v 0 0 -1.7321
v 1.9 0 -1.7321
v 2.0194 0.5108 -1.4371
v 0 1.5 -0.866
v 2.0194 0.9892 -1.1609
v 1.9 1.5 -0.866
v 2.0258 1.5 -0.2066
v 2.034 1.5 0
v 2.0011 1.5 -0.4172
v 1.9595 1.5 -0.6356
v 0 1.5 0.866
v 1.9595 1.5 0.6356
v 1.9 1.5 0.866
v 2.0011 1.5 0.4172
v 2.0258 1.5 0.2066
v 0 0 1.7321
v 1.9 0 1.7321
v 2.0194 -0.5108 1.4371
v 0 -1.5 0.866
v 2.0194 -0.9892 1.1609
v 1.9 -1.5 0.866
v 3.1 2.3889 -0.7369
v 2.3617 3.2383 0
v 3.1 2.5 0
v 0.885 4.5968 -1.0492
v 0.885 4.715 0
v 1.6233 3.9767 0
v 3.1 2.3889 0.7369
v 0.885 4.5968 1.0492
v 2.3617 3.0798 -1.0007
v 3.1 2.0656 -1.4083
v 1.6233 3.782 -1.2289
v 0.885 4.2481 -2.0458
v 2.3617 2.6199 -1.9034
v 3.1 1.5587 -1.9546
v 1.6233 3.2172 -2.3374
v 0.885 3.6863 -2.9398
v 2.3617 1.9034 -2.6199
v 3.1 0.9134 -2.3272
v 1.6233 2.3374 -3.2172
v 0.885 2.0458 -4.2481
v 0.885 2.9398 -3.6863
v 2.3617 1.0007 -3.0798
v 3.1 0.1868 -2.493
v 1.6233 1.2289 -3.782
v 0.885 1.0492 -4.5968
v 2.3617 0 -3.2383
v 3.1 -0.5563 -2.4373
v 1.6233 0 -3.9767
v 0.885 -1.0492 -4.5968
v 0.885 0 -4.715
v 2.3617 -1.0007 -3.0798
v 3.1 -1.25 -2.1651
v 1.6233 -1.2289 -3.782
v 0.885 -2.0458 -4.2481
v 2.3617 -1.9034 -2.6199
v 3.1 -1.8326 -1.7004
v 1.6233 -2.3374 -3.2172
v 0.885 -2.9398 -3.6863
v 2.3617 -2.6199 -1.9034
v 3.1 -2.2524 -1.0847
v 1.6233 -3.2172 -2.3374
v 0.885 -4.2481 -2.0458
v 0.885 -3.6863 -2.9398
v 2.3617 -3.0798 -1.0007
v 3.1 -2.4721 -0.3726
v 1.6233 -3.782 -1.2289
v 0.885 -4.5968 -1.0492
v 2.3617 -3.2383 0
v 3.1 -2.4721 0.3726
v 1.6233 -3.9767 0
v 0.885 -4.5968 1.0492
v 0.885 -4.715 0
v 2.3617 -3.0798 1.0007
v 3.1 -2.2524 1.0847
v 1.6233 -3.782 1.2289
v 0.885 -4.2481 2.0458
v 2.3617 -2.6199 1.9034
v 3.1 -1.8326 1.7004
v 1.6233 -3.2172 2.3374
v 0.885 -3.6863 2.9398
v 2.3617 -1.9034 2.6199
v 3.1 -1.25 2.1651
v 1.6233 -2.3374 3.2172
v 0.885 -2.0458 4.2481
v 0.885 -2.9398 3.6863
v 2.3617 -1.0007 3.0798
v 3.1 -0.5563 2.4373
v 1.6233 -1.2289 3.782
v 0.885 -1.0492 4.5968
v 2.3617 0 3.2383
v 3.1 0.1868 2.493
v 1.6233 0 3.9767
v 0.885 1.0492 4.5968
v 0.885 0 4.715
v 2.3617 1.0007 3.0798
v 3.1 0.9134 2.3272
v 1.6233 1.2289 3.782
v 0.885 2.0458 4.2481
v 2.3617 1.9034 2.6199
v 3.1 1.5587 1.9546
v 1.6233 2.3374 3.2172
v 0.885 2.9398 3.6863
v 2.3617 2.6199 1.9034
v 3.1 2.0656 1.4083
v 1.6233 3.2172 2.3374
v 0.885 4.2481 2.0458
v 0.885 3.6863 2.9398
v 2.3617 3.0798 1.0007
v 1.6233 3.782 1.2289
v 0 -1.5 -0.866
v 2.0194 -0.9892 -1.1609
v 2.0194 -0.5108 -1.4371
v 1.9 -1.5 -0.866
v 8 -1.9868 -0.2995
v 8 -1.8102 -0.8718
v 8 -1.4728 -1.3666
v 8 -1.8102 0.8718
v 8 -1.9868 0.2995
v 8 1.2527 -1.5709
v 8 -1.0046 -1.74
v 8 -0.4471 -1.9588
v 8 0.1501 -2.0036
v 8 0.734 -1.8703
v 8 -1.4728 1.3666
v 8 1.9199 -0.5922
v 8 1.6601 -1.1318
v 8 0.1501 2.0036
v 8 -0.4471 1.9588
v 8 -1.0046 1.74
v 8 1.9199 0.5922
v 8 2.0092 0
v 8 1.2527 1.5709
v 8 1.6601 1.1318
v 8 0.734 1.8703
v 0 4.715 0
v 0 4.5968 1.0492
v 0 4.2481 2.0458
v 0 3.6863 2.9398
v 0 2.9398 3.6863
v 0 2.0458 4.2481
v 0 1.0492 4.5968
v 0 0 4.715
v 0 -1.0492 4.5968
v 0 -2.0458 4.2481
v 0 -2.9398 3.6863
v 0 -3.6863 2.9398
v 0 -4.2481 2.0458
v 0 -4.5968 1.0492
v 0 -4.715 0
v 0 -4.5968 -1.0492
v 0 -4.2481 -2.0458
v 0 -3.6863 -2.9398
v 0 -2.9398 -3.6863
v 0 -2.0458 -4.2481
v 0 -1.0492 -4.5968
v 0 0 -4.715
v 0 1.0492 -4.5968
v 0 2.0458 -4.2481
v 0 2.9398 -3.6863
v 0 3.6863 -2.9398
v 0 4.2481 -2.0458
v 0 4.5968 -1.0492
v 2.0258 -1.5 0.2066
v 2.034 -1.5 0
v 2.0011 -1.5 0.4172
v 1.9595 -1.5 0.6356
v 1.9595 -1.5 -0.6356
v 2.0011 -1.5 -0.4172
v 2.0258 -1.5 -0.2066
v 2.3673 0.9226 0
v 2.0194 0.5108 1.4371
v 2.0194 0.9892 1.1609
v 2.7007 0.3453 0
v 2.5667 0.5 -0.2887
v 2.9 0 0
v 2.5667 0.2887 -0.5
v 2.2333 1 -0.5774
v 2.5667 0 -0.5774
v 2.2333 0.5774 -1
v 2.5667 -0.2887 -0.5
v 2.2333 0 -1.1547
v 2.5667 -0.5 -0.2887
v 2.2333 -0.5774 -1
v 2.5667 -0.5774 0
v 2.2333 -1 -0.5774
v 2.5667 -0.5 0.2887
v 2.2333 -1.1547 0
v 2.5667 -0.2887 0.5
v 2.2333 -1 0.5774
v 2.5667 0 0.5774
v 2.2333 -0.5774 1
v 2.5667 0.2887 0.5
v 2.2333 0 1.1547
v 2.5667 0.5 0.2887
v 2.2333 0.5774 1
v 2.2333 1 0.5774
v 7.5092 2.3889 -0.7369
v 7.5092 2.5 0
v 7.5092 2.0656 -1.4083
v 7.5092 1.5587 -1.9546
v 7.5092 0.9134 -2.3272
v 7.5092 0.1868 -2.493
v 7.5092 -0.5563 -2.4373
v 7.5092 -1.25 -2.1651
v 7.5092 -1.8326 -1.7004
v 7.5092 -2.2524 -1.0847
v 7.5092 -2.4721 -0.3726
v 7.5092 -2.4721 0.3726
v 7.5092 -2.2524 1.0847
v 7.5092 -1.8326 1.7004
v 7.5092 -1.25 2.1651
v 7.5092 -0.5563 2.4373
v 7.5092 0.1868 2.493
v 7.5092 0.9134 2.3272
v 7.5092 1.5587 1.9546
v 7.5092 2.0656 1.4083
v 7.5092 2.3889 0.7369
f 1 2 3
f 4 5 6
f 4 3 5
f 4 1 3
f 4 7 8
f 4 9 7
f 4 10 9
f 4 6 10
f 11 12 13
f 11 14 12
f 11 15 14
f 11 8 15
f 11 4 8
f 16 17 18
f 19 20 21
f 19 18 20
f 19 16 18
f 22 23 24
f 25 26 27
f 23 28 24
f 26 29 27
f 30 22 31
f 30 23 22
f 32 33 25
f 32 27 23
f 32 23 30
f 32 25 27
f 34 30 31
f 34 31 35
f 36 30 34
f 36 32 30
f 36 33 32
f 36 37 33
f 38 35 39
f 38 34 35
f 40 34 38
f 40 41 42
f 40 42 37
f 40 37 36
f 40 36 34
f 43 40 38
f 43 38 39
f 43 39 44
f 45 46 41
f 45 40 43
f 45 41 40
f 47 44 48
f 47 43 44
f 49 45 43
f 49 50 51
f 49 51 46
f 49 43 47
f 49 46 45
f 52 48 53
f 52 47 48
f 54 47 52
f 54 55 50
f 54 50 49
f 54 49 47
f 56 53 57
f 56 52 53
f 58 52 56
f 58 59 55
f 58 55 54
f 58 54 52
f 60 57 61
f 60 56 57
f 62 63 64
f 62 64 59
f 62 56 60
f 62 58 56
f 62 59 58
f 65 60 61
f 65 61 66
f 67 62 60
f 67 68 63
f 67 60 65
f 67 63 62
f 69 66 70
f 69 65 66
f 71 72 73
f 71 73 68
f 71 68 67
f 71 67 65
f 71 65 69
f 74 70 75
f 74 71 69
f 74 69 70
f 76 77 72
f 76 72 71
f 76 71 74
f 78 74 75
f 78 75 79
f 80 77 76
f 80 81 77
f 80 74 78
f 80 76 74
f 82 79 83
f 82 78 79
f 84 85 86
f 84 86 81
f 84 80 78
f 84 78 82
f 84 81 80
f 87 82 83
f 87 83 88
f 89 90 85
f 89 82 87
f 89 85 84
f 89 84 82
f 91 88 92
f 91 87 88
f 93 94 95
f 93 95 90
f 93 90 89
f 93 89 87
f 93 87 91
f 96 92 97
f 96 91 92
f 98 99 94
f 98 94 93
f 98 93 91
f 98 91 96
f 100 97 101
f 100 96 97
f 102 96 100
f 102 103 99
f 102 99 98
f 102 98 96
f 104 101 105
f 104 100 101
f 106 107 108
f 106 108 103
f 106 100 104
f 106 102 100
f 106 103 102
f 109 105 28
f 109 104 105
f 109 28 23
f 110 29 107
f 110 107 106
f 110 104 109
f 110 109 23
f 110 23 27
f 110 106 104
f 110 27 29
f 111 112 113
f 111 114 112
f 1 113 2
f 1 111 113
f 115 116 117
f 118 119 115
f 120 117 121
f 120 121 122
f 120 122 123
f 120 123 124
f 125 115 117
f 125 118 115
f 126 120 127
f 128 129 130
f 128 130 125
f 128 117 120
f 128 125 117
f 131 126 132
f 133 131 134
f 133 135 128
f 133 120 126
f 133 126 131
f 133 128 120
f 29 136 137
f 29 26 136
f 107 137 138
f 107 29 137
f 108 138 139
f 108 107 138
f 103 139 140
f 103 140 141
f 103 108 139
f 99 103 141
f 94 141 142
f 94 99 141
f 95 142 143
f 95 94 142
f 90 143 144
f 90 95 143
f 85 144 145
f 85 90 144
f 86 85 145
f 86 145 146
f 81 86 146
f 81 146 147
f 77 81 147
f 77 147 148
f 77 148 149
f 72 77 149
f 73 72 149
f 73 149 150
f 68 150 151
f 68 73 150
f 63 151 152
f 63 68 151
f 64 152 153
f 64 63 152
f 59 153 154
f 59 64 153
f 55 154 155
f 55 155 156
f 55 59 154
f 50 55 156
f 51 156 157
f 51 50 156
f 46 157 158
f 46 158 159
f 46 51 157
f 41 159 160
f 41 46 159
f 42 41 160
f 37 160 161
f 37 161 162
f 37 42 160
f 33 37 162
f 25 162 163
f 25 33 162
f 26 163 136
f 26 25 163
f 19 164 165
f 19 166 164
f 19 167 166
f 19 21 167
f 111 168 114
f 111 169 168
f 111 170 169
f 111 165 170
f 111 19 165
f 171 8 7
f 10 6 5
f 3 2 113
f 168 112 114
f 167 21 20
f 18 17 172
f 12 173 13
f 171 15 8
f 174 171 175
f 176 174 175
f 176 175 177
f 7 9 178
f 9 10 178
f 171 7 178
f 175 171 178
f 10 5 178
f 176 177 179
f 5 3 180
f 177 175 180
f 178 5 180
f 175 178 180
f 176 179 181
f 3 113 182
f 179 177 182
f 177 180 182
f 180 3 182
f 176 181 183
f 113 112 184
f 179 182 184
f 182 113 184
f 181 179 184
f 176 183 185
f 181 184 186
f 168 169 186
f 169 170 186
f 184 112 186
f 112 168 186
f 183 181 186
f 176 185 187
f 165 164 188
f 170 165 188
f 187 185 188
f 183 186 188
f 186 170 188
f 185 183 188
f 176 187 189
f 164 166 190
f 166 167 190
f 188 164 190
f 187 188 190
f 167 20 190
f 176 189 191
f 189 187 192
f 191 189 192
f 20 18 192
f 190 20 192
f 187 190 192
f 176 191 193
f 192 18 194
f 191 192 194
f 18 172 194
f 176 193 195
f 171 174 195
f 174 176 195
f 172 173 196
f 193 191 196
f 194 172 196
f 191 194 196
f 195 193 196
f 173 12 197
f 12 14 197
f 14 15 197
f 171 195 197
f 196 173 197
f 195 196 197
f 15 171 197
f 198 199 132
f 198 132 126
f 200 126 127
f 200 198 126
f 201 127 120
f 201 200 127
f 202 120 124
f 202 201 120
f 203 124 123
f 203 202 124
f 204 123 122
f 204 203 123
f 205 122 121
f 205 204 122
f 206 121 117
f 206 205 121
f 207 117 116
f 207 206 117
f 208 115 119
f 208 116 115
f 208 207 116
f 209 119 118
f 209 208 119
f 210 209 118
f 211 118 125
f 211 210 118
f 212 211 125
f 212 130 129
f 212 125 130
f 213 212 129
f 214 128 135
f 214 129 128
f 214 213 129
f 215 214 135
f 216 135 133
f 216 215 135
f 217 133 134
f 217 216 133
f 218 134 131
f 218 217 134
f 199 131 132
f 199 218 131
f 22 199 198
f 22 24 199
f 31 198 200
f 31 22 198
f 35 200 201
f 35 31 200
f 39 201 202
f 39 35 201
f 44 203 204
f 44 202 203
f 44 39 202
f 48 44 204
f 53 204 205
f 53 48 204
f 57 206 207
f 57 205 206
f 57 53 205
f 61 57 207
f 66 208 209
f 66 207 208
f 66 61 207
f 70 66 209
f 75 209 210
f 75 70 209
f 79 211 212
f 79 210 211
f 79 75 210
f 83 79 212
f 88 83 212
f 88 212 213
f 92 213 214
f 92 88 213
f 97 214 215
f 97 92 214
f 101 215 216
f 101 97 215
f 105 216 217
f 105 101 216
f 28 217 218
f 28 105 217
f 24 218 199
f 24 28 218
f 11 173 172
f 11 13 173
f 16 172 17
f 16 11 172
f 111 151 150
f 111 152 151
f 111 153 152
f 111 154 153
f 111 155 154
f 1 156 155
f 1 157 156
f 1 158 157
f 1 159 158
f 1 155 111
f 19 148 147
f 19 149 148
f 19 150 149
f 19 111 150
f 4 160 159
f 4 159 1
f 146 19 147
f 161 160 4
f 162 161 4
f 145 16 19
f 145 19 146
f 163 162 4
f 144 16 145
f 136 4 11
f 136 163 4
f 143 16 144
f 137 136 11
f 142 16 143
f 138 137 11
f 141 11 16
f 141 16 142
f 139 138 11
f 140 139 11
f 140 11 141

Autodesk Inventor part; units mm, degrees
ref_plane "YZ Plane" through (0, 0, 0) normal (1, 0, 0) x (0, 1, 0)
ref_plane "XZ Plane" through (0, 0, 0) normal (0, 1, 0) x (-1, 0, 0)
sketch "Skizze1" plane through (0, 0, 0) normal (0, 0, 1) x (1, 0, 0)
  line L0 (8, 0) -> (8, 2.5)
  line L1 (8, 2.5) -> (5.5, 2.5)
  line L2 (5.5, 2.5) -> (5.0092, 2.5)
  line L3 (0, 4.715) -> (0, 1.7321)
  line L4 (0, 1.7321) -> (1.9, 1.7321)
  line L5 (1.9, 1.7321) -> (2.9, 0)
  line L6 (2.9, 0) -> (8, 0)
  line L7 (0, 4.715) -> (0.885, 4.715)
  line L8 (0.885, 4.715) -> (3.1, 2.5)
  line L9 (5.0092, 2.5) -> (3.1, 2.5)
  line L10 (5.5, 2.5) -> (3.1, 2.5) construction
  line L11 (3.1, 2.5) -> (3.1, 2.5)
  line L12 (-1.6, 0) -> (9.6, 0) projected
  line L13 (0, -0.943) -> (0, 5.658) projected
  dimension "d0" = 8
  dimension "d1" = 2.5
  dimension "d2" = 1.9
  dimension "d3" = 5
  dimension "d6" = 3.1
  dimension "d7" = 45
  dimension "d8" = 3.4641
  dimension "d9" = 60
  dimension "d10" = 9.43
  dimension "d11" = 5
  dimension "d12" = 0.4908
revolve "Körper" add sketch "Skizze1" angle 360 about axis through (2.9, 0, 0) along (1, 0, 0) contours L6 L5 L4 L3 L7 L8 L9 L2 L1 L0
sketch "Skizze2" plane through (0, 0, 0) normal (-1, 0, 0) x (0, 0, 1)
  circle A0 centre (0, 0) radius 1.7321 projected
  line L0 (0, -6.601) -> (0, 6.601) projected
  line L1 (-6.601, 0) -> (6.601, 0) projected
  line L2 (1.7321, 0) -> (0.866, -1.5)
  line L3 (0.866, -1.5) -> (-0.866, -1.5)
  line L4 (-0.866, -1.5) -> (-1.7321, 0)
  line L5 (-1.7321, 0) -> (-0.866, 1.5)
  line L6 (-0.866, 1.5) -> (0.866, 1.5)
  line L7 (0.866, 1.5) -> (1.7321, 0)
  point P0 (0, 1.7321)
extrude "Loch" add sketch "Skizze2" against normal up to next contours L7 A0 | A0 L2 | L6 L0 A0 | A0 L0 L3 | L0 L6 A0 | A0 L3 L0 | L4 A0 | A0 L5
thread "Gewinde" size "M5x0.8" class "6g" standard "ISO Metric profile" length 2.5
chamfer "Fase1" distance 0.4908 distance2 0.4908 1 edges at (8, -2.5, 0) measured on face at (8, 0.4809, 1.5312)
ref_plane "Work Plane1" through (104.775, 0, 0) normal (0, 0, -1) x (1, 0, 0)
equation "\"d15\" = GEL"
equation "\"d17\" = -0.5 * SPD + 0.5 * GD"
equation "\"d18\" = GUL"
equation "\"d0\" = NLG"
equation "\"d1\" = GEL"
equation "\"d2\" = INTI"
equation "\"d3\" = GD"
equation "\"d6\" = KOH"
equation "\"d7\" = 0.5 * SEWI"
equation "\"d8\" = 1.1547 * SW"
equation "\"d10\" = KOD"
equation "\"d11\" = BDM"
equation "\"d12\" = GAL"
equation "\"NLG\" = 8"
equation "\"INTI\" = 1.9"
equation "\"GEL\" = 2.5"
equation "\"GAL\" = 0.61345 * PTC"
equation "\"KOH\" = 3.1"
equation "\"KOD\" = 9.43"
equation "\"GUL\" = 0.61345 * PTC"
equation "\"SPD\" = NND - 1.2269 * PTC"
equation "\"BDM\" = NND"
equation "\"GD\" = NND"
equation "\"SEWI\" = 90deg"
equation "\"SW\" = 3"
equation "\"TOA\" = 30deg"
equation "\"GD1\" = THREADDIA - 1.2269 * PTC"
equation "\"EPV\" = 5.5"
equation "\"THREADDIA\" = 5"
equation "\"PTC\" = 0.8"
equation "\"NND\" = 5"
equation "\"E0\" = 3.47"
properties part number "ISO 10642  - M5  x  8" material "Stahl"
